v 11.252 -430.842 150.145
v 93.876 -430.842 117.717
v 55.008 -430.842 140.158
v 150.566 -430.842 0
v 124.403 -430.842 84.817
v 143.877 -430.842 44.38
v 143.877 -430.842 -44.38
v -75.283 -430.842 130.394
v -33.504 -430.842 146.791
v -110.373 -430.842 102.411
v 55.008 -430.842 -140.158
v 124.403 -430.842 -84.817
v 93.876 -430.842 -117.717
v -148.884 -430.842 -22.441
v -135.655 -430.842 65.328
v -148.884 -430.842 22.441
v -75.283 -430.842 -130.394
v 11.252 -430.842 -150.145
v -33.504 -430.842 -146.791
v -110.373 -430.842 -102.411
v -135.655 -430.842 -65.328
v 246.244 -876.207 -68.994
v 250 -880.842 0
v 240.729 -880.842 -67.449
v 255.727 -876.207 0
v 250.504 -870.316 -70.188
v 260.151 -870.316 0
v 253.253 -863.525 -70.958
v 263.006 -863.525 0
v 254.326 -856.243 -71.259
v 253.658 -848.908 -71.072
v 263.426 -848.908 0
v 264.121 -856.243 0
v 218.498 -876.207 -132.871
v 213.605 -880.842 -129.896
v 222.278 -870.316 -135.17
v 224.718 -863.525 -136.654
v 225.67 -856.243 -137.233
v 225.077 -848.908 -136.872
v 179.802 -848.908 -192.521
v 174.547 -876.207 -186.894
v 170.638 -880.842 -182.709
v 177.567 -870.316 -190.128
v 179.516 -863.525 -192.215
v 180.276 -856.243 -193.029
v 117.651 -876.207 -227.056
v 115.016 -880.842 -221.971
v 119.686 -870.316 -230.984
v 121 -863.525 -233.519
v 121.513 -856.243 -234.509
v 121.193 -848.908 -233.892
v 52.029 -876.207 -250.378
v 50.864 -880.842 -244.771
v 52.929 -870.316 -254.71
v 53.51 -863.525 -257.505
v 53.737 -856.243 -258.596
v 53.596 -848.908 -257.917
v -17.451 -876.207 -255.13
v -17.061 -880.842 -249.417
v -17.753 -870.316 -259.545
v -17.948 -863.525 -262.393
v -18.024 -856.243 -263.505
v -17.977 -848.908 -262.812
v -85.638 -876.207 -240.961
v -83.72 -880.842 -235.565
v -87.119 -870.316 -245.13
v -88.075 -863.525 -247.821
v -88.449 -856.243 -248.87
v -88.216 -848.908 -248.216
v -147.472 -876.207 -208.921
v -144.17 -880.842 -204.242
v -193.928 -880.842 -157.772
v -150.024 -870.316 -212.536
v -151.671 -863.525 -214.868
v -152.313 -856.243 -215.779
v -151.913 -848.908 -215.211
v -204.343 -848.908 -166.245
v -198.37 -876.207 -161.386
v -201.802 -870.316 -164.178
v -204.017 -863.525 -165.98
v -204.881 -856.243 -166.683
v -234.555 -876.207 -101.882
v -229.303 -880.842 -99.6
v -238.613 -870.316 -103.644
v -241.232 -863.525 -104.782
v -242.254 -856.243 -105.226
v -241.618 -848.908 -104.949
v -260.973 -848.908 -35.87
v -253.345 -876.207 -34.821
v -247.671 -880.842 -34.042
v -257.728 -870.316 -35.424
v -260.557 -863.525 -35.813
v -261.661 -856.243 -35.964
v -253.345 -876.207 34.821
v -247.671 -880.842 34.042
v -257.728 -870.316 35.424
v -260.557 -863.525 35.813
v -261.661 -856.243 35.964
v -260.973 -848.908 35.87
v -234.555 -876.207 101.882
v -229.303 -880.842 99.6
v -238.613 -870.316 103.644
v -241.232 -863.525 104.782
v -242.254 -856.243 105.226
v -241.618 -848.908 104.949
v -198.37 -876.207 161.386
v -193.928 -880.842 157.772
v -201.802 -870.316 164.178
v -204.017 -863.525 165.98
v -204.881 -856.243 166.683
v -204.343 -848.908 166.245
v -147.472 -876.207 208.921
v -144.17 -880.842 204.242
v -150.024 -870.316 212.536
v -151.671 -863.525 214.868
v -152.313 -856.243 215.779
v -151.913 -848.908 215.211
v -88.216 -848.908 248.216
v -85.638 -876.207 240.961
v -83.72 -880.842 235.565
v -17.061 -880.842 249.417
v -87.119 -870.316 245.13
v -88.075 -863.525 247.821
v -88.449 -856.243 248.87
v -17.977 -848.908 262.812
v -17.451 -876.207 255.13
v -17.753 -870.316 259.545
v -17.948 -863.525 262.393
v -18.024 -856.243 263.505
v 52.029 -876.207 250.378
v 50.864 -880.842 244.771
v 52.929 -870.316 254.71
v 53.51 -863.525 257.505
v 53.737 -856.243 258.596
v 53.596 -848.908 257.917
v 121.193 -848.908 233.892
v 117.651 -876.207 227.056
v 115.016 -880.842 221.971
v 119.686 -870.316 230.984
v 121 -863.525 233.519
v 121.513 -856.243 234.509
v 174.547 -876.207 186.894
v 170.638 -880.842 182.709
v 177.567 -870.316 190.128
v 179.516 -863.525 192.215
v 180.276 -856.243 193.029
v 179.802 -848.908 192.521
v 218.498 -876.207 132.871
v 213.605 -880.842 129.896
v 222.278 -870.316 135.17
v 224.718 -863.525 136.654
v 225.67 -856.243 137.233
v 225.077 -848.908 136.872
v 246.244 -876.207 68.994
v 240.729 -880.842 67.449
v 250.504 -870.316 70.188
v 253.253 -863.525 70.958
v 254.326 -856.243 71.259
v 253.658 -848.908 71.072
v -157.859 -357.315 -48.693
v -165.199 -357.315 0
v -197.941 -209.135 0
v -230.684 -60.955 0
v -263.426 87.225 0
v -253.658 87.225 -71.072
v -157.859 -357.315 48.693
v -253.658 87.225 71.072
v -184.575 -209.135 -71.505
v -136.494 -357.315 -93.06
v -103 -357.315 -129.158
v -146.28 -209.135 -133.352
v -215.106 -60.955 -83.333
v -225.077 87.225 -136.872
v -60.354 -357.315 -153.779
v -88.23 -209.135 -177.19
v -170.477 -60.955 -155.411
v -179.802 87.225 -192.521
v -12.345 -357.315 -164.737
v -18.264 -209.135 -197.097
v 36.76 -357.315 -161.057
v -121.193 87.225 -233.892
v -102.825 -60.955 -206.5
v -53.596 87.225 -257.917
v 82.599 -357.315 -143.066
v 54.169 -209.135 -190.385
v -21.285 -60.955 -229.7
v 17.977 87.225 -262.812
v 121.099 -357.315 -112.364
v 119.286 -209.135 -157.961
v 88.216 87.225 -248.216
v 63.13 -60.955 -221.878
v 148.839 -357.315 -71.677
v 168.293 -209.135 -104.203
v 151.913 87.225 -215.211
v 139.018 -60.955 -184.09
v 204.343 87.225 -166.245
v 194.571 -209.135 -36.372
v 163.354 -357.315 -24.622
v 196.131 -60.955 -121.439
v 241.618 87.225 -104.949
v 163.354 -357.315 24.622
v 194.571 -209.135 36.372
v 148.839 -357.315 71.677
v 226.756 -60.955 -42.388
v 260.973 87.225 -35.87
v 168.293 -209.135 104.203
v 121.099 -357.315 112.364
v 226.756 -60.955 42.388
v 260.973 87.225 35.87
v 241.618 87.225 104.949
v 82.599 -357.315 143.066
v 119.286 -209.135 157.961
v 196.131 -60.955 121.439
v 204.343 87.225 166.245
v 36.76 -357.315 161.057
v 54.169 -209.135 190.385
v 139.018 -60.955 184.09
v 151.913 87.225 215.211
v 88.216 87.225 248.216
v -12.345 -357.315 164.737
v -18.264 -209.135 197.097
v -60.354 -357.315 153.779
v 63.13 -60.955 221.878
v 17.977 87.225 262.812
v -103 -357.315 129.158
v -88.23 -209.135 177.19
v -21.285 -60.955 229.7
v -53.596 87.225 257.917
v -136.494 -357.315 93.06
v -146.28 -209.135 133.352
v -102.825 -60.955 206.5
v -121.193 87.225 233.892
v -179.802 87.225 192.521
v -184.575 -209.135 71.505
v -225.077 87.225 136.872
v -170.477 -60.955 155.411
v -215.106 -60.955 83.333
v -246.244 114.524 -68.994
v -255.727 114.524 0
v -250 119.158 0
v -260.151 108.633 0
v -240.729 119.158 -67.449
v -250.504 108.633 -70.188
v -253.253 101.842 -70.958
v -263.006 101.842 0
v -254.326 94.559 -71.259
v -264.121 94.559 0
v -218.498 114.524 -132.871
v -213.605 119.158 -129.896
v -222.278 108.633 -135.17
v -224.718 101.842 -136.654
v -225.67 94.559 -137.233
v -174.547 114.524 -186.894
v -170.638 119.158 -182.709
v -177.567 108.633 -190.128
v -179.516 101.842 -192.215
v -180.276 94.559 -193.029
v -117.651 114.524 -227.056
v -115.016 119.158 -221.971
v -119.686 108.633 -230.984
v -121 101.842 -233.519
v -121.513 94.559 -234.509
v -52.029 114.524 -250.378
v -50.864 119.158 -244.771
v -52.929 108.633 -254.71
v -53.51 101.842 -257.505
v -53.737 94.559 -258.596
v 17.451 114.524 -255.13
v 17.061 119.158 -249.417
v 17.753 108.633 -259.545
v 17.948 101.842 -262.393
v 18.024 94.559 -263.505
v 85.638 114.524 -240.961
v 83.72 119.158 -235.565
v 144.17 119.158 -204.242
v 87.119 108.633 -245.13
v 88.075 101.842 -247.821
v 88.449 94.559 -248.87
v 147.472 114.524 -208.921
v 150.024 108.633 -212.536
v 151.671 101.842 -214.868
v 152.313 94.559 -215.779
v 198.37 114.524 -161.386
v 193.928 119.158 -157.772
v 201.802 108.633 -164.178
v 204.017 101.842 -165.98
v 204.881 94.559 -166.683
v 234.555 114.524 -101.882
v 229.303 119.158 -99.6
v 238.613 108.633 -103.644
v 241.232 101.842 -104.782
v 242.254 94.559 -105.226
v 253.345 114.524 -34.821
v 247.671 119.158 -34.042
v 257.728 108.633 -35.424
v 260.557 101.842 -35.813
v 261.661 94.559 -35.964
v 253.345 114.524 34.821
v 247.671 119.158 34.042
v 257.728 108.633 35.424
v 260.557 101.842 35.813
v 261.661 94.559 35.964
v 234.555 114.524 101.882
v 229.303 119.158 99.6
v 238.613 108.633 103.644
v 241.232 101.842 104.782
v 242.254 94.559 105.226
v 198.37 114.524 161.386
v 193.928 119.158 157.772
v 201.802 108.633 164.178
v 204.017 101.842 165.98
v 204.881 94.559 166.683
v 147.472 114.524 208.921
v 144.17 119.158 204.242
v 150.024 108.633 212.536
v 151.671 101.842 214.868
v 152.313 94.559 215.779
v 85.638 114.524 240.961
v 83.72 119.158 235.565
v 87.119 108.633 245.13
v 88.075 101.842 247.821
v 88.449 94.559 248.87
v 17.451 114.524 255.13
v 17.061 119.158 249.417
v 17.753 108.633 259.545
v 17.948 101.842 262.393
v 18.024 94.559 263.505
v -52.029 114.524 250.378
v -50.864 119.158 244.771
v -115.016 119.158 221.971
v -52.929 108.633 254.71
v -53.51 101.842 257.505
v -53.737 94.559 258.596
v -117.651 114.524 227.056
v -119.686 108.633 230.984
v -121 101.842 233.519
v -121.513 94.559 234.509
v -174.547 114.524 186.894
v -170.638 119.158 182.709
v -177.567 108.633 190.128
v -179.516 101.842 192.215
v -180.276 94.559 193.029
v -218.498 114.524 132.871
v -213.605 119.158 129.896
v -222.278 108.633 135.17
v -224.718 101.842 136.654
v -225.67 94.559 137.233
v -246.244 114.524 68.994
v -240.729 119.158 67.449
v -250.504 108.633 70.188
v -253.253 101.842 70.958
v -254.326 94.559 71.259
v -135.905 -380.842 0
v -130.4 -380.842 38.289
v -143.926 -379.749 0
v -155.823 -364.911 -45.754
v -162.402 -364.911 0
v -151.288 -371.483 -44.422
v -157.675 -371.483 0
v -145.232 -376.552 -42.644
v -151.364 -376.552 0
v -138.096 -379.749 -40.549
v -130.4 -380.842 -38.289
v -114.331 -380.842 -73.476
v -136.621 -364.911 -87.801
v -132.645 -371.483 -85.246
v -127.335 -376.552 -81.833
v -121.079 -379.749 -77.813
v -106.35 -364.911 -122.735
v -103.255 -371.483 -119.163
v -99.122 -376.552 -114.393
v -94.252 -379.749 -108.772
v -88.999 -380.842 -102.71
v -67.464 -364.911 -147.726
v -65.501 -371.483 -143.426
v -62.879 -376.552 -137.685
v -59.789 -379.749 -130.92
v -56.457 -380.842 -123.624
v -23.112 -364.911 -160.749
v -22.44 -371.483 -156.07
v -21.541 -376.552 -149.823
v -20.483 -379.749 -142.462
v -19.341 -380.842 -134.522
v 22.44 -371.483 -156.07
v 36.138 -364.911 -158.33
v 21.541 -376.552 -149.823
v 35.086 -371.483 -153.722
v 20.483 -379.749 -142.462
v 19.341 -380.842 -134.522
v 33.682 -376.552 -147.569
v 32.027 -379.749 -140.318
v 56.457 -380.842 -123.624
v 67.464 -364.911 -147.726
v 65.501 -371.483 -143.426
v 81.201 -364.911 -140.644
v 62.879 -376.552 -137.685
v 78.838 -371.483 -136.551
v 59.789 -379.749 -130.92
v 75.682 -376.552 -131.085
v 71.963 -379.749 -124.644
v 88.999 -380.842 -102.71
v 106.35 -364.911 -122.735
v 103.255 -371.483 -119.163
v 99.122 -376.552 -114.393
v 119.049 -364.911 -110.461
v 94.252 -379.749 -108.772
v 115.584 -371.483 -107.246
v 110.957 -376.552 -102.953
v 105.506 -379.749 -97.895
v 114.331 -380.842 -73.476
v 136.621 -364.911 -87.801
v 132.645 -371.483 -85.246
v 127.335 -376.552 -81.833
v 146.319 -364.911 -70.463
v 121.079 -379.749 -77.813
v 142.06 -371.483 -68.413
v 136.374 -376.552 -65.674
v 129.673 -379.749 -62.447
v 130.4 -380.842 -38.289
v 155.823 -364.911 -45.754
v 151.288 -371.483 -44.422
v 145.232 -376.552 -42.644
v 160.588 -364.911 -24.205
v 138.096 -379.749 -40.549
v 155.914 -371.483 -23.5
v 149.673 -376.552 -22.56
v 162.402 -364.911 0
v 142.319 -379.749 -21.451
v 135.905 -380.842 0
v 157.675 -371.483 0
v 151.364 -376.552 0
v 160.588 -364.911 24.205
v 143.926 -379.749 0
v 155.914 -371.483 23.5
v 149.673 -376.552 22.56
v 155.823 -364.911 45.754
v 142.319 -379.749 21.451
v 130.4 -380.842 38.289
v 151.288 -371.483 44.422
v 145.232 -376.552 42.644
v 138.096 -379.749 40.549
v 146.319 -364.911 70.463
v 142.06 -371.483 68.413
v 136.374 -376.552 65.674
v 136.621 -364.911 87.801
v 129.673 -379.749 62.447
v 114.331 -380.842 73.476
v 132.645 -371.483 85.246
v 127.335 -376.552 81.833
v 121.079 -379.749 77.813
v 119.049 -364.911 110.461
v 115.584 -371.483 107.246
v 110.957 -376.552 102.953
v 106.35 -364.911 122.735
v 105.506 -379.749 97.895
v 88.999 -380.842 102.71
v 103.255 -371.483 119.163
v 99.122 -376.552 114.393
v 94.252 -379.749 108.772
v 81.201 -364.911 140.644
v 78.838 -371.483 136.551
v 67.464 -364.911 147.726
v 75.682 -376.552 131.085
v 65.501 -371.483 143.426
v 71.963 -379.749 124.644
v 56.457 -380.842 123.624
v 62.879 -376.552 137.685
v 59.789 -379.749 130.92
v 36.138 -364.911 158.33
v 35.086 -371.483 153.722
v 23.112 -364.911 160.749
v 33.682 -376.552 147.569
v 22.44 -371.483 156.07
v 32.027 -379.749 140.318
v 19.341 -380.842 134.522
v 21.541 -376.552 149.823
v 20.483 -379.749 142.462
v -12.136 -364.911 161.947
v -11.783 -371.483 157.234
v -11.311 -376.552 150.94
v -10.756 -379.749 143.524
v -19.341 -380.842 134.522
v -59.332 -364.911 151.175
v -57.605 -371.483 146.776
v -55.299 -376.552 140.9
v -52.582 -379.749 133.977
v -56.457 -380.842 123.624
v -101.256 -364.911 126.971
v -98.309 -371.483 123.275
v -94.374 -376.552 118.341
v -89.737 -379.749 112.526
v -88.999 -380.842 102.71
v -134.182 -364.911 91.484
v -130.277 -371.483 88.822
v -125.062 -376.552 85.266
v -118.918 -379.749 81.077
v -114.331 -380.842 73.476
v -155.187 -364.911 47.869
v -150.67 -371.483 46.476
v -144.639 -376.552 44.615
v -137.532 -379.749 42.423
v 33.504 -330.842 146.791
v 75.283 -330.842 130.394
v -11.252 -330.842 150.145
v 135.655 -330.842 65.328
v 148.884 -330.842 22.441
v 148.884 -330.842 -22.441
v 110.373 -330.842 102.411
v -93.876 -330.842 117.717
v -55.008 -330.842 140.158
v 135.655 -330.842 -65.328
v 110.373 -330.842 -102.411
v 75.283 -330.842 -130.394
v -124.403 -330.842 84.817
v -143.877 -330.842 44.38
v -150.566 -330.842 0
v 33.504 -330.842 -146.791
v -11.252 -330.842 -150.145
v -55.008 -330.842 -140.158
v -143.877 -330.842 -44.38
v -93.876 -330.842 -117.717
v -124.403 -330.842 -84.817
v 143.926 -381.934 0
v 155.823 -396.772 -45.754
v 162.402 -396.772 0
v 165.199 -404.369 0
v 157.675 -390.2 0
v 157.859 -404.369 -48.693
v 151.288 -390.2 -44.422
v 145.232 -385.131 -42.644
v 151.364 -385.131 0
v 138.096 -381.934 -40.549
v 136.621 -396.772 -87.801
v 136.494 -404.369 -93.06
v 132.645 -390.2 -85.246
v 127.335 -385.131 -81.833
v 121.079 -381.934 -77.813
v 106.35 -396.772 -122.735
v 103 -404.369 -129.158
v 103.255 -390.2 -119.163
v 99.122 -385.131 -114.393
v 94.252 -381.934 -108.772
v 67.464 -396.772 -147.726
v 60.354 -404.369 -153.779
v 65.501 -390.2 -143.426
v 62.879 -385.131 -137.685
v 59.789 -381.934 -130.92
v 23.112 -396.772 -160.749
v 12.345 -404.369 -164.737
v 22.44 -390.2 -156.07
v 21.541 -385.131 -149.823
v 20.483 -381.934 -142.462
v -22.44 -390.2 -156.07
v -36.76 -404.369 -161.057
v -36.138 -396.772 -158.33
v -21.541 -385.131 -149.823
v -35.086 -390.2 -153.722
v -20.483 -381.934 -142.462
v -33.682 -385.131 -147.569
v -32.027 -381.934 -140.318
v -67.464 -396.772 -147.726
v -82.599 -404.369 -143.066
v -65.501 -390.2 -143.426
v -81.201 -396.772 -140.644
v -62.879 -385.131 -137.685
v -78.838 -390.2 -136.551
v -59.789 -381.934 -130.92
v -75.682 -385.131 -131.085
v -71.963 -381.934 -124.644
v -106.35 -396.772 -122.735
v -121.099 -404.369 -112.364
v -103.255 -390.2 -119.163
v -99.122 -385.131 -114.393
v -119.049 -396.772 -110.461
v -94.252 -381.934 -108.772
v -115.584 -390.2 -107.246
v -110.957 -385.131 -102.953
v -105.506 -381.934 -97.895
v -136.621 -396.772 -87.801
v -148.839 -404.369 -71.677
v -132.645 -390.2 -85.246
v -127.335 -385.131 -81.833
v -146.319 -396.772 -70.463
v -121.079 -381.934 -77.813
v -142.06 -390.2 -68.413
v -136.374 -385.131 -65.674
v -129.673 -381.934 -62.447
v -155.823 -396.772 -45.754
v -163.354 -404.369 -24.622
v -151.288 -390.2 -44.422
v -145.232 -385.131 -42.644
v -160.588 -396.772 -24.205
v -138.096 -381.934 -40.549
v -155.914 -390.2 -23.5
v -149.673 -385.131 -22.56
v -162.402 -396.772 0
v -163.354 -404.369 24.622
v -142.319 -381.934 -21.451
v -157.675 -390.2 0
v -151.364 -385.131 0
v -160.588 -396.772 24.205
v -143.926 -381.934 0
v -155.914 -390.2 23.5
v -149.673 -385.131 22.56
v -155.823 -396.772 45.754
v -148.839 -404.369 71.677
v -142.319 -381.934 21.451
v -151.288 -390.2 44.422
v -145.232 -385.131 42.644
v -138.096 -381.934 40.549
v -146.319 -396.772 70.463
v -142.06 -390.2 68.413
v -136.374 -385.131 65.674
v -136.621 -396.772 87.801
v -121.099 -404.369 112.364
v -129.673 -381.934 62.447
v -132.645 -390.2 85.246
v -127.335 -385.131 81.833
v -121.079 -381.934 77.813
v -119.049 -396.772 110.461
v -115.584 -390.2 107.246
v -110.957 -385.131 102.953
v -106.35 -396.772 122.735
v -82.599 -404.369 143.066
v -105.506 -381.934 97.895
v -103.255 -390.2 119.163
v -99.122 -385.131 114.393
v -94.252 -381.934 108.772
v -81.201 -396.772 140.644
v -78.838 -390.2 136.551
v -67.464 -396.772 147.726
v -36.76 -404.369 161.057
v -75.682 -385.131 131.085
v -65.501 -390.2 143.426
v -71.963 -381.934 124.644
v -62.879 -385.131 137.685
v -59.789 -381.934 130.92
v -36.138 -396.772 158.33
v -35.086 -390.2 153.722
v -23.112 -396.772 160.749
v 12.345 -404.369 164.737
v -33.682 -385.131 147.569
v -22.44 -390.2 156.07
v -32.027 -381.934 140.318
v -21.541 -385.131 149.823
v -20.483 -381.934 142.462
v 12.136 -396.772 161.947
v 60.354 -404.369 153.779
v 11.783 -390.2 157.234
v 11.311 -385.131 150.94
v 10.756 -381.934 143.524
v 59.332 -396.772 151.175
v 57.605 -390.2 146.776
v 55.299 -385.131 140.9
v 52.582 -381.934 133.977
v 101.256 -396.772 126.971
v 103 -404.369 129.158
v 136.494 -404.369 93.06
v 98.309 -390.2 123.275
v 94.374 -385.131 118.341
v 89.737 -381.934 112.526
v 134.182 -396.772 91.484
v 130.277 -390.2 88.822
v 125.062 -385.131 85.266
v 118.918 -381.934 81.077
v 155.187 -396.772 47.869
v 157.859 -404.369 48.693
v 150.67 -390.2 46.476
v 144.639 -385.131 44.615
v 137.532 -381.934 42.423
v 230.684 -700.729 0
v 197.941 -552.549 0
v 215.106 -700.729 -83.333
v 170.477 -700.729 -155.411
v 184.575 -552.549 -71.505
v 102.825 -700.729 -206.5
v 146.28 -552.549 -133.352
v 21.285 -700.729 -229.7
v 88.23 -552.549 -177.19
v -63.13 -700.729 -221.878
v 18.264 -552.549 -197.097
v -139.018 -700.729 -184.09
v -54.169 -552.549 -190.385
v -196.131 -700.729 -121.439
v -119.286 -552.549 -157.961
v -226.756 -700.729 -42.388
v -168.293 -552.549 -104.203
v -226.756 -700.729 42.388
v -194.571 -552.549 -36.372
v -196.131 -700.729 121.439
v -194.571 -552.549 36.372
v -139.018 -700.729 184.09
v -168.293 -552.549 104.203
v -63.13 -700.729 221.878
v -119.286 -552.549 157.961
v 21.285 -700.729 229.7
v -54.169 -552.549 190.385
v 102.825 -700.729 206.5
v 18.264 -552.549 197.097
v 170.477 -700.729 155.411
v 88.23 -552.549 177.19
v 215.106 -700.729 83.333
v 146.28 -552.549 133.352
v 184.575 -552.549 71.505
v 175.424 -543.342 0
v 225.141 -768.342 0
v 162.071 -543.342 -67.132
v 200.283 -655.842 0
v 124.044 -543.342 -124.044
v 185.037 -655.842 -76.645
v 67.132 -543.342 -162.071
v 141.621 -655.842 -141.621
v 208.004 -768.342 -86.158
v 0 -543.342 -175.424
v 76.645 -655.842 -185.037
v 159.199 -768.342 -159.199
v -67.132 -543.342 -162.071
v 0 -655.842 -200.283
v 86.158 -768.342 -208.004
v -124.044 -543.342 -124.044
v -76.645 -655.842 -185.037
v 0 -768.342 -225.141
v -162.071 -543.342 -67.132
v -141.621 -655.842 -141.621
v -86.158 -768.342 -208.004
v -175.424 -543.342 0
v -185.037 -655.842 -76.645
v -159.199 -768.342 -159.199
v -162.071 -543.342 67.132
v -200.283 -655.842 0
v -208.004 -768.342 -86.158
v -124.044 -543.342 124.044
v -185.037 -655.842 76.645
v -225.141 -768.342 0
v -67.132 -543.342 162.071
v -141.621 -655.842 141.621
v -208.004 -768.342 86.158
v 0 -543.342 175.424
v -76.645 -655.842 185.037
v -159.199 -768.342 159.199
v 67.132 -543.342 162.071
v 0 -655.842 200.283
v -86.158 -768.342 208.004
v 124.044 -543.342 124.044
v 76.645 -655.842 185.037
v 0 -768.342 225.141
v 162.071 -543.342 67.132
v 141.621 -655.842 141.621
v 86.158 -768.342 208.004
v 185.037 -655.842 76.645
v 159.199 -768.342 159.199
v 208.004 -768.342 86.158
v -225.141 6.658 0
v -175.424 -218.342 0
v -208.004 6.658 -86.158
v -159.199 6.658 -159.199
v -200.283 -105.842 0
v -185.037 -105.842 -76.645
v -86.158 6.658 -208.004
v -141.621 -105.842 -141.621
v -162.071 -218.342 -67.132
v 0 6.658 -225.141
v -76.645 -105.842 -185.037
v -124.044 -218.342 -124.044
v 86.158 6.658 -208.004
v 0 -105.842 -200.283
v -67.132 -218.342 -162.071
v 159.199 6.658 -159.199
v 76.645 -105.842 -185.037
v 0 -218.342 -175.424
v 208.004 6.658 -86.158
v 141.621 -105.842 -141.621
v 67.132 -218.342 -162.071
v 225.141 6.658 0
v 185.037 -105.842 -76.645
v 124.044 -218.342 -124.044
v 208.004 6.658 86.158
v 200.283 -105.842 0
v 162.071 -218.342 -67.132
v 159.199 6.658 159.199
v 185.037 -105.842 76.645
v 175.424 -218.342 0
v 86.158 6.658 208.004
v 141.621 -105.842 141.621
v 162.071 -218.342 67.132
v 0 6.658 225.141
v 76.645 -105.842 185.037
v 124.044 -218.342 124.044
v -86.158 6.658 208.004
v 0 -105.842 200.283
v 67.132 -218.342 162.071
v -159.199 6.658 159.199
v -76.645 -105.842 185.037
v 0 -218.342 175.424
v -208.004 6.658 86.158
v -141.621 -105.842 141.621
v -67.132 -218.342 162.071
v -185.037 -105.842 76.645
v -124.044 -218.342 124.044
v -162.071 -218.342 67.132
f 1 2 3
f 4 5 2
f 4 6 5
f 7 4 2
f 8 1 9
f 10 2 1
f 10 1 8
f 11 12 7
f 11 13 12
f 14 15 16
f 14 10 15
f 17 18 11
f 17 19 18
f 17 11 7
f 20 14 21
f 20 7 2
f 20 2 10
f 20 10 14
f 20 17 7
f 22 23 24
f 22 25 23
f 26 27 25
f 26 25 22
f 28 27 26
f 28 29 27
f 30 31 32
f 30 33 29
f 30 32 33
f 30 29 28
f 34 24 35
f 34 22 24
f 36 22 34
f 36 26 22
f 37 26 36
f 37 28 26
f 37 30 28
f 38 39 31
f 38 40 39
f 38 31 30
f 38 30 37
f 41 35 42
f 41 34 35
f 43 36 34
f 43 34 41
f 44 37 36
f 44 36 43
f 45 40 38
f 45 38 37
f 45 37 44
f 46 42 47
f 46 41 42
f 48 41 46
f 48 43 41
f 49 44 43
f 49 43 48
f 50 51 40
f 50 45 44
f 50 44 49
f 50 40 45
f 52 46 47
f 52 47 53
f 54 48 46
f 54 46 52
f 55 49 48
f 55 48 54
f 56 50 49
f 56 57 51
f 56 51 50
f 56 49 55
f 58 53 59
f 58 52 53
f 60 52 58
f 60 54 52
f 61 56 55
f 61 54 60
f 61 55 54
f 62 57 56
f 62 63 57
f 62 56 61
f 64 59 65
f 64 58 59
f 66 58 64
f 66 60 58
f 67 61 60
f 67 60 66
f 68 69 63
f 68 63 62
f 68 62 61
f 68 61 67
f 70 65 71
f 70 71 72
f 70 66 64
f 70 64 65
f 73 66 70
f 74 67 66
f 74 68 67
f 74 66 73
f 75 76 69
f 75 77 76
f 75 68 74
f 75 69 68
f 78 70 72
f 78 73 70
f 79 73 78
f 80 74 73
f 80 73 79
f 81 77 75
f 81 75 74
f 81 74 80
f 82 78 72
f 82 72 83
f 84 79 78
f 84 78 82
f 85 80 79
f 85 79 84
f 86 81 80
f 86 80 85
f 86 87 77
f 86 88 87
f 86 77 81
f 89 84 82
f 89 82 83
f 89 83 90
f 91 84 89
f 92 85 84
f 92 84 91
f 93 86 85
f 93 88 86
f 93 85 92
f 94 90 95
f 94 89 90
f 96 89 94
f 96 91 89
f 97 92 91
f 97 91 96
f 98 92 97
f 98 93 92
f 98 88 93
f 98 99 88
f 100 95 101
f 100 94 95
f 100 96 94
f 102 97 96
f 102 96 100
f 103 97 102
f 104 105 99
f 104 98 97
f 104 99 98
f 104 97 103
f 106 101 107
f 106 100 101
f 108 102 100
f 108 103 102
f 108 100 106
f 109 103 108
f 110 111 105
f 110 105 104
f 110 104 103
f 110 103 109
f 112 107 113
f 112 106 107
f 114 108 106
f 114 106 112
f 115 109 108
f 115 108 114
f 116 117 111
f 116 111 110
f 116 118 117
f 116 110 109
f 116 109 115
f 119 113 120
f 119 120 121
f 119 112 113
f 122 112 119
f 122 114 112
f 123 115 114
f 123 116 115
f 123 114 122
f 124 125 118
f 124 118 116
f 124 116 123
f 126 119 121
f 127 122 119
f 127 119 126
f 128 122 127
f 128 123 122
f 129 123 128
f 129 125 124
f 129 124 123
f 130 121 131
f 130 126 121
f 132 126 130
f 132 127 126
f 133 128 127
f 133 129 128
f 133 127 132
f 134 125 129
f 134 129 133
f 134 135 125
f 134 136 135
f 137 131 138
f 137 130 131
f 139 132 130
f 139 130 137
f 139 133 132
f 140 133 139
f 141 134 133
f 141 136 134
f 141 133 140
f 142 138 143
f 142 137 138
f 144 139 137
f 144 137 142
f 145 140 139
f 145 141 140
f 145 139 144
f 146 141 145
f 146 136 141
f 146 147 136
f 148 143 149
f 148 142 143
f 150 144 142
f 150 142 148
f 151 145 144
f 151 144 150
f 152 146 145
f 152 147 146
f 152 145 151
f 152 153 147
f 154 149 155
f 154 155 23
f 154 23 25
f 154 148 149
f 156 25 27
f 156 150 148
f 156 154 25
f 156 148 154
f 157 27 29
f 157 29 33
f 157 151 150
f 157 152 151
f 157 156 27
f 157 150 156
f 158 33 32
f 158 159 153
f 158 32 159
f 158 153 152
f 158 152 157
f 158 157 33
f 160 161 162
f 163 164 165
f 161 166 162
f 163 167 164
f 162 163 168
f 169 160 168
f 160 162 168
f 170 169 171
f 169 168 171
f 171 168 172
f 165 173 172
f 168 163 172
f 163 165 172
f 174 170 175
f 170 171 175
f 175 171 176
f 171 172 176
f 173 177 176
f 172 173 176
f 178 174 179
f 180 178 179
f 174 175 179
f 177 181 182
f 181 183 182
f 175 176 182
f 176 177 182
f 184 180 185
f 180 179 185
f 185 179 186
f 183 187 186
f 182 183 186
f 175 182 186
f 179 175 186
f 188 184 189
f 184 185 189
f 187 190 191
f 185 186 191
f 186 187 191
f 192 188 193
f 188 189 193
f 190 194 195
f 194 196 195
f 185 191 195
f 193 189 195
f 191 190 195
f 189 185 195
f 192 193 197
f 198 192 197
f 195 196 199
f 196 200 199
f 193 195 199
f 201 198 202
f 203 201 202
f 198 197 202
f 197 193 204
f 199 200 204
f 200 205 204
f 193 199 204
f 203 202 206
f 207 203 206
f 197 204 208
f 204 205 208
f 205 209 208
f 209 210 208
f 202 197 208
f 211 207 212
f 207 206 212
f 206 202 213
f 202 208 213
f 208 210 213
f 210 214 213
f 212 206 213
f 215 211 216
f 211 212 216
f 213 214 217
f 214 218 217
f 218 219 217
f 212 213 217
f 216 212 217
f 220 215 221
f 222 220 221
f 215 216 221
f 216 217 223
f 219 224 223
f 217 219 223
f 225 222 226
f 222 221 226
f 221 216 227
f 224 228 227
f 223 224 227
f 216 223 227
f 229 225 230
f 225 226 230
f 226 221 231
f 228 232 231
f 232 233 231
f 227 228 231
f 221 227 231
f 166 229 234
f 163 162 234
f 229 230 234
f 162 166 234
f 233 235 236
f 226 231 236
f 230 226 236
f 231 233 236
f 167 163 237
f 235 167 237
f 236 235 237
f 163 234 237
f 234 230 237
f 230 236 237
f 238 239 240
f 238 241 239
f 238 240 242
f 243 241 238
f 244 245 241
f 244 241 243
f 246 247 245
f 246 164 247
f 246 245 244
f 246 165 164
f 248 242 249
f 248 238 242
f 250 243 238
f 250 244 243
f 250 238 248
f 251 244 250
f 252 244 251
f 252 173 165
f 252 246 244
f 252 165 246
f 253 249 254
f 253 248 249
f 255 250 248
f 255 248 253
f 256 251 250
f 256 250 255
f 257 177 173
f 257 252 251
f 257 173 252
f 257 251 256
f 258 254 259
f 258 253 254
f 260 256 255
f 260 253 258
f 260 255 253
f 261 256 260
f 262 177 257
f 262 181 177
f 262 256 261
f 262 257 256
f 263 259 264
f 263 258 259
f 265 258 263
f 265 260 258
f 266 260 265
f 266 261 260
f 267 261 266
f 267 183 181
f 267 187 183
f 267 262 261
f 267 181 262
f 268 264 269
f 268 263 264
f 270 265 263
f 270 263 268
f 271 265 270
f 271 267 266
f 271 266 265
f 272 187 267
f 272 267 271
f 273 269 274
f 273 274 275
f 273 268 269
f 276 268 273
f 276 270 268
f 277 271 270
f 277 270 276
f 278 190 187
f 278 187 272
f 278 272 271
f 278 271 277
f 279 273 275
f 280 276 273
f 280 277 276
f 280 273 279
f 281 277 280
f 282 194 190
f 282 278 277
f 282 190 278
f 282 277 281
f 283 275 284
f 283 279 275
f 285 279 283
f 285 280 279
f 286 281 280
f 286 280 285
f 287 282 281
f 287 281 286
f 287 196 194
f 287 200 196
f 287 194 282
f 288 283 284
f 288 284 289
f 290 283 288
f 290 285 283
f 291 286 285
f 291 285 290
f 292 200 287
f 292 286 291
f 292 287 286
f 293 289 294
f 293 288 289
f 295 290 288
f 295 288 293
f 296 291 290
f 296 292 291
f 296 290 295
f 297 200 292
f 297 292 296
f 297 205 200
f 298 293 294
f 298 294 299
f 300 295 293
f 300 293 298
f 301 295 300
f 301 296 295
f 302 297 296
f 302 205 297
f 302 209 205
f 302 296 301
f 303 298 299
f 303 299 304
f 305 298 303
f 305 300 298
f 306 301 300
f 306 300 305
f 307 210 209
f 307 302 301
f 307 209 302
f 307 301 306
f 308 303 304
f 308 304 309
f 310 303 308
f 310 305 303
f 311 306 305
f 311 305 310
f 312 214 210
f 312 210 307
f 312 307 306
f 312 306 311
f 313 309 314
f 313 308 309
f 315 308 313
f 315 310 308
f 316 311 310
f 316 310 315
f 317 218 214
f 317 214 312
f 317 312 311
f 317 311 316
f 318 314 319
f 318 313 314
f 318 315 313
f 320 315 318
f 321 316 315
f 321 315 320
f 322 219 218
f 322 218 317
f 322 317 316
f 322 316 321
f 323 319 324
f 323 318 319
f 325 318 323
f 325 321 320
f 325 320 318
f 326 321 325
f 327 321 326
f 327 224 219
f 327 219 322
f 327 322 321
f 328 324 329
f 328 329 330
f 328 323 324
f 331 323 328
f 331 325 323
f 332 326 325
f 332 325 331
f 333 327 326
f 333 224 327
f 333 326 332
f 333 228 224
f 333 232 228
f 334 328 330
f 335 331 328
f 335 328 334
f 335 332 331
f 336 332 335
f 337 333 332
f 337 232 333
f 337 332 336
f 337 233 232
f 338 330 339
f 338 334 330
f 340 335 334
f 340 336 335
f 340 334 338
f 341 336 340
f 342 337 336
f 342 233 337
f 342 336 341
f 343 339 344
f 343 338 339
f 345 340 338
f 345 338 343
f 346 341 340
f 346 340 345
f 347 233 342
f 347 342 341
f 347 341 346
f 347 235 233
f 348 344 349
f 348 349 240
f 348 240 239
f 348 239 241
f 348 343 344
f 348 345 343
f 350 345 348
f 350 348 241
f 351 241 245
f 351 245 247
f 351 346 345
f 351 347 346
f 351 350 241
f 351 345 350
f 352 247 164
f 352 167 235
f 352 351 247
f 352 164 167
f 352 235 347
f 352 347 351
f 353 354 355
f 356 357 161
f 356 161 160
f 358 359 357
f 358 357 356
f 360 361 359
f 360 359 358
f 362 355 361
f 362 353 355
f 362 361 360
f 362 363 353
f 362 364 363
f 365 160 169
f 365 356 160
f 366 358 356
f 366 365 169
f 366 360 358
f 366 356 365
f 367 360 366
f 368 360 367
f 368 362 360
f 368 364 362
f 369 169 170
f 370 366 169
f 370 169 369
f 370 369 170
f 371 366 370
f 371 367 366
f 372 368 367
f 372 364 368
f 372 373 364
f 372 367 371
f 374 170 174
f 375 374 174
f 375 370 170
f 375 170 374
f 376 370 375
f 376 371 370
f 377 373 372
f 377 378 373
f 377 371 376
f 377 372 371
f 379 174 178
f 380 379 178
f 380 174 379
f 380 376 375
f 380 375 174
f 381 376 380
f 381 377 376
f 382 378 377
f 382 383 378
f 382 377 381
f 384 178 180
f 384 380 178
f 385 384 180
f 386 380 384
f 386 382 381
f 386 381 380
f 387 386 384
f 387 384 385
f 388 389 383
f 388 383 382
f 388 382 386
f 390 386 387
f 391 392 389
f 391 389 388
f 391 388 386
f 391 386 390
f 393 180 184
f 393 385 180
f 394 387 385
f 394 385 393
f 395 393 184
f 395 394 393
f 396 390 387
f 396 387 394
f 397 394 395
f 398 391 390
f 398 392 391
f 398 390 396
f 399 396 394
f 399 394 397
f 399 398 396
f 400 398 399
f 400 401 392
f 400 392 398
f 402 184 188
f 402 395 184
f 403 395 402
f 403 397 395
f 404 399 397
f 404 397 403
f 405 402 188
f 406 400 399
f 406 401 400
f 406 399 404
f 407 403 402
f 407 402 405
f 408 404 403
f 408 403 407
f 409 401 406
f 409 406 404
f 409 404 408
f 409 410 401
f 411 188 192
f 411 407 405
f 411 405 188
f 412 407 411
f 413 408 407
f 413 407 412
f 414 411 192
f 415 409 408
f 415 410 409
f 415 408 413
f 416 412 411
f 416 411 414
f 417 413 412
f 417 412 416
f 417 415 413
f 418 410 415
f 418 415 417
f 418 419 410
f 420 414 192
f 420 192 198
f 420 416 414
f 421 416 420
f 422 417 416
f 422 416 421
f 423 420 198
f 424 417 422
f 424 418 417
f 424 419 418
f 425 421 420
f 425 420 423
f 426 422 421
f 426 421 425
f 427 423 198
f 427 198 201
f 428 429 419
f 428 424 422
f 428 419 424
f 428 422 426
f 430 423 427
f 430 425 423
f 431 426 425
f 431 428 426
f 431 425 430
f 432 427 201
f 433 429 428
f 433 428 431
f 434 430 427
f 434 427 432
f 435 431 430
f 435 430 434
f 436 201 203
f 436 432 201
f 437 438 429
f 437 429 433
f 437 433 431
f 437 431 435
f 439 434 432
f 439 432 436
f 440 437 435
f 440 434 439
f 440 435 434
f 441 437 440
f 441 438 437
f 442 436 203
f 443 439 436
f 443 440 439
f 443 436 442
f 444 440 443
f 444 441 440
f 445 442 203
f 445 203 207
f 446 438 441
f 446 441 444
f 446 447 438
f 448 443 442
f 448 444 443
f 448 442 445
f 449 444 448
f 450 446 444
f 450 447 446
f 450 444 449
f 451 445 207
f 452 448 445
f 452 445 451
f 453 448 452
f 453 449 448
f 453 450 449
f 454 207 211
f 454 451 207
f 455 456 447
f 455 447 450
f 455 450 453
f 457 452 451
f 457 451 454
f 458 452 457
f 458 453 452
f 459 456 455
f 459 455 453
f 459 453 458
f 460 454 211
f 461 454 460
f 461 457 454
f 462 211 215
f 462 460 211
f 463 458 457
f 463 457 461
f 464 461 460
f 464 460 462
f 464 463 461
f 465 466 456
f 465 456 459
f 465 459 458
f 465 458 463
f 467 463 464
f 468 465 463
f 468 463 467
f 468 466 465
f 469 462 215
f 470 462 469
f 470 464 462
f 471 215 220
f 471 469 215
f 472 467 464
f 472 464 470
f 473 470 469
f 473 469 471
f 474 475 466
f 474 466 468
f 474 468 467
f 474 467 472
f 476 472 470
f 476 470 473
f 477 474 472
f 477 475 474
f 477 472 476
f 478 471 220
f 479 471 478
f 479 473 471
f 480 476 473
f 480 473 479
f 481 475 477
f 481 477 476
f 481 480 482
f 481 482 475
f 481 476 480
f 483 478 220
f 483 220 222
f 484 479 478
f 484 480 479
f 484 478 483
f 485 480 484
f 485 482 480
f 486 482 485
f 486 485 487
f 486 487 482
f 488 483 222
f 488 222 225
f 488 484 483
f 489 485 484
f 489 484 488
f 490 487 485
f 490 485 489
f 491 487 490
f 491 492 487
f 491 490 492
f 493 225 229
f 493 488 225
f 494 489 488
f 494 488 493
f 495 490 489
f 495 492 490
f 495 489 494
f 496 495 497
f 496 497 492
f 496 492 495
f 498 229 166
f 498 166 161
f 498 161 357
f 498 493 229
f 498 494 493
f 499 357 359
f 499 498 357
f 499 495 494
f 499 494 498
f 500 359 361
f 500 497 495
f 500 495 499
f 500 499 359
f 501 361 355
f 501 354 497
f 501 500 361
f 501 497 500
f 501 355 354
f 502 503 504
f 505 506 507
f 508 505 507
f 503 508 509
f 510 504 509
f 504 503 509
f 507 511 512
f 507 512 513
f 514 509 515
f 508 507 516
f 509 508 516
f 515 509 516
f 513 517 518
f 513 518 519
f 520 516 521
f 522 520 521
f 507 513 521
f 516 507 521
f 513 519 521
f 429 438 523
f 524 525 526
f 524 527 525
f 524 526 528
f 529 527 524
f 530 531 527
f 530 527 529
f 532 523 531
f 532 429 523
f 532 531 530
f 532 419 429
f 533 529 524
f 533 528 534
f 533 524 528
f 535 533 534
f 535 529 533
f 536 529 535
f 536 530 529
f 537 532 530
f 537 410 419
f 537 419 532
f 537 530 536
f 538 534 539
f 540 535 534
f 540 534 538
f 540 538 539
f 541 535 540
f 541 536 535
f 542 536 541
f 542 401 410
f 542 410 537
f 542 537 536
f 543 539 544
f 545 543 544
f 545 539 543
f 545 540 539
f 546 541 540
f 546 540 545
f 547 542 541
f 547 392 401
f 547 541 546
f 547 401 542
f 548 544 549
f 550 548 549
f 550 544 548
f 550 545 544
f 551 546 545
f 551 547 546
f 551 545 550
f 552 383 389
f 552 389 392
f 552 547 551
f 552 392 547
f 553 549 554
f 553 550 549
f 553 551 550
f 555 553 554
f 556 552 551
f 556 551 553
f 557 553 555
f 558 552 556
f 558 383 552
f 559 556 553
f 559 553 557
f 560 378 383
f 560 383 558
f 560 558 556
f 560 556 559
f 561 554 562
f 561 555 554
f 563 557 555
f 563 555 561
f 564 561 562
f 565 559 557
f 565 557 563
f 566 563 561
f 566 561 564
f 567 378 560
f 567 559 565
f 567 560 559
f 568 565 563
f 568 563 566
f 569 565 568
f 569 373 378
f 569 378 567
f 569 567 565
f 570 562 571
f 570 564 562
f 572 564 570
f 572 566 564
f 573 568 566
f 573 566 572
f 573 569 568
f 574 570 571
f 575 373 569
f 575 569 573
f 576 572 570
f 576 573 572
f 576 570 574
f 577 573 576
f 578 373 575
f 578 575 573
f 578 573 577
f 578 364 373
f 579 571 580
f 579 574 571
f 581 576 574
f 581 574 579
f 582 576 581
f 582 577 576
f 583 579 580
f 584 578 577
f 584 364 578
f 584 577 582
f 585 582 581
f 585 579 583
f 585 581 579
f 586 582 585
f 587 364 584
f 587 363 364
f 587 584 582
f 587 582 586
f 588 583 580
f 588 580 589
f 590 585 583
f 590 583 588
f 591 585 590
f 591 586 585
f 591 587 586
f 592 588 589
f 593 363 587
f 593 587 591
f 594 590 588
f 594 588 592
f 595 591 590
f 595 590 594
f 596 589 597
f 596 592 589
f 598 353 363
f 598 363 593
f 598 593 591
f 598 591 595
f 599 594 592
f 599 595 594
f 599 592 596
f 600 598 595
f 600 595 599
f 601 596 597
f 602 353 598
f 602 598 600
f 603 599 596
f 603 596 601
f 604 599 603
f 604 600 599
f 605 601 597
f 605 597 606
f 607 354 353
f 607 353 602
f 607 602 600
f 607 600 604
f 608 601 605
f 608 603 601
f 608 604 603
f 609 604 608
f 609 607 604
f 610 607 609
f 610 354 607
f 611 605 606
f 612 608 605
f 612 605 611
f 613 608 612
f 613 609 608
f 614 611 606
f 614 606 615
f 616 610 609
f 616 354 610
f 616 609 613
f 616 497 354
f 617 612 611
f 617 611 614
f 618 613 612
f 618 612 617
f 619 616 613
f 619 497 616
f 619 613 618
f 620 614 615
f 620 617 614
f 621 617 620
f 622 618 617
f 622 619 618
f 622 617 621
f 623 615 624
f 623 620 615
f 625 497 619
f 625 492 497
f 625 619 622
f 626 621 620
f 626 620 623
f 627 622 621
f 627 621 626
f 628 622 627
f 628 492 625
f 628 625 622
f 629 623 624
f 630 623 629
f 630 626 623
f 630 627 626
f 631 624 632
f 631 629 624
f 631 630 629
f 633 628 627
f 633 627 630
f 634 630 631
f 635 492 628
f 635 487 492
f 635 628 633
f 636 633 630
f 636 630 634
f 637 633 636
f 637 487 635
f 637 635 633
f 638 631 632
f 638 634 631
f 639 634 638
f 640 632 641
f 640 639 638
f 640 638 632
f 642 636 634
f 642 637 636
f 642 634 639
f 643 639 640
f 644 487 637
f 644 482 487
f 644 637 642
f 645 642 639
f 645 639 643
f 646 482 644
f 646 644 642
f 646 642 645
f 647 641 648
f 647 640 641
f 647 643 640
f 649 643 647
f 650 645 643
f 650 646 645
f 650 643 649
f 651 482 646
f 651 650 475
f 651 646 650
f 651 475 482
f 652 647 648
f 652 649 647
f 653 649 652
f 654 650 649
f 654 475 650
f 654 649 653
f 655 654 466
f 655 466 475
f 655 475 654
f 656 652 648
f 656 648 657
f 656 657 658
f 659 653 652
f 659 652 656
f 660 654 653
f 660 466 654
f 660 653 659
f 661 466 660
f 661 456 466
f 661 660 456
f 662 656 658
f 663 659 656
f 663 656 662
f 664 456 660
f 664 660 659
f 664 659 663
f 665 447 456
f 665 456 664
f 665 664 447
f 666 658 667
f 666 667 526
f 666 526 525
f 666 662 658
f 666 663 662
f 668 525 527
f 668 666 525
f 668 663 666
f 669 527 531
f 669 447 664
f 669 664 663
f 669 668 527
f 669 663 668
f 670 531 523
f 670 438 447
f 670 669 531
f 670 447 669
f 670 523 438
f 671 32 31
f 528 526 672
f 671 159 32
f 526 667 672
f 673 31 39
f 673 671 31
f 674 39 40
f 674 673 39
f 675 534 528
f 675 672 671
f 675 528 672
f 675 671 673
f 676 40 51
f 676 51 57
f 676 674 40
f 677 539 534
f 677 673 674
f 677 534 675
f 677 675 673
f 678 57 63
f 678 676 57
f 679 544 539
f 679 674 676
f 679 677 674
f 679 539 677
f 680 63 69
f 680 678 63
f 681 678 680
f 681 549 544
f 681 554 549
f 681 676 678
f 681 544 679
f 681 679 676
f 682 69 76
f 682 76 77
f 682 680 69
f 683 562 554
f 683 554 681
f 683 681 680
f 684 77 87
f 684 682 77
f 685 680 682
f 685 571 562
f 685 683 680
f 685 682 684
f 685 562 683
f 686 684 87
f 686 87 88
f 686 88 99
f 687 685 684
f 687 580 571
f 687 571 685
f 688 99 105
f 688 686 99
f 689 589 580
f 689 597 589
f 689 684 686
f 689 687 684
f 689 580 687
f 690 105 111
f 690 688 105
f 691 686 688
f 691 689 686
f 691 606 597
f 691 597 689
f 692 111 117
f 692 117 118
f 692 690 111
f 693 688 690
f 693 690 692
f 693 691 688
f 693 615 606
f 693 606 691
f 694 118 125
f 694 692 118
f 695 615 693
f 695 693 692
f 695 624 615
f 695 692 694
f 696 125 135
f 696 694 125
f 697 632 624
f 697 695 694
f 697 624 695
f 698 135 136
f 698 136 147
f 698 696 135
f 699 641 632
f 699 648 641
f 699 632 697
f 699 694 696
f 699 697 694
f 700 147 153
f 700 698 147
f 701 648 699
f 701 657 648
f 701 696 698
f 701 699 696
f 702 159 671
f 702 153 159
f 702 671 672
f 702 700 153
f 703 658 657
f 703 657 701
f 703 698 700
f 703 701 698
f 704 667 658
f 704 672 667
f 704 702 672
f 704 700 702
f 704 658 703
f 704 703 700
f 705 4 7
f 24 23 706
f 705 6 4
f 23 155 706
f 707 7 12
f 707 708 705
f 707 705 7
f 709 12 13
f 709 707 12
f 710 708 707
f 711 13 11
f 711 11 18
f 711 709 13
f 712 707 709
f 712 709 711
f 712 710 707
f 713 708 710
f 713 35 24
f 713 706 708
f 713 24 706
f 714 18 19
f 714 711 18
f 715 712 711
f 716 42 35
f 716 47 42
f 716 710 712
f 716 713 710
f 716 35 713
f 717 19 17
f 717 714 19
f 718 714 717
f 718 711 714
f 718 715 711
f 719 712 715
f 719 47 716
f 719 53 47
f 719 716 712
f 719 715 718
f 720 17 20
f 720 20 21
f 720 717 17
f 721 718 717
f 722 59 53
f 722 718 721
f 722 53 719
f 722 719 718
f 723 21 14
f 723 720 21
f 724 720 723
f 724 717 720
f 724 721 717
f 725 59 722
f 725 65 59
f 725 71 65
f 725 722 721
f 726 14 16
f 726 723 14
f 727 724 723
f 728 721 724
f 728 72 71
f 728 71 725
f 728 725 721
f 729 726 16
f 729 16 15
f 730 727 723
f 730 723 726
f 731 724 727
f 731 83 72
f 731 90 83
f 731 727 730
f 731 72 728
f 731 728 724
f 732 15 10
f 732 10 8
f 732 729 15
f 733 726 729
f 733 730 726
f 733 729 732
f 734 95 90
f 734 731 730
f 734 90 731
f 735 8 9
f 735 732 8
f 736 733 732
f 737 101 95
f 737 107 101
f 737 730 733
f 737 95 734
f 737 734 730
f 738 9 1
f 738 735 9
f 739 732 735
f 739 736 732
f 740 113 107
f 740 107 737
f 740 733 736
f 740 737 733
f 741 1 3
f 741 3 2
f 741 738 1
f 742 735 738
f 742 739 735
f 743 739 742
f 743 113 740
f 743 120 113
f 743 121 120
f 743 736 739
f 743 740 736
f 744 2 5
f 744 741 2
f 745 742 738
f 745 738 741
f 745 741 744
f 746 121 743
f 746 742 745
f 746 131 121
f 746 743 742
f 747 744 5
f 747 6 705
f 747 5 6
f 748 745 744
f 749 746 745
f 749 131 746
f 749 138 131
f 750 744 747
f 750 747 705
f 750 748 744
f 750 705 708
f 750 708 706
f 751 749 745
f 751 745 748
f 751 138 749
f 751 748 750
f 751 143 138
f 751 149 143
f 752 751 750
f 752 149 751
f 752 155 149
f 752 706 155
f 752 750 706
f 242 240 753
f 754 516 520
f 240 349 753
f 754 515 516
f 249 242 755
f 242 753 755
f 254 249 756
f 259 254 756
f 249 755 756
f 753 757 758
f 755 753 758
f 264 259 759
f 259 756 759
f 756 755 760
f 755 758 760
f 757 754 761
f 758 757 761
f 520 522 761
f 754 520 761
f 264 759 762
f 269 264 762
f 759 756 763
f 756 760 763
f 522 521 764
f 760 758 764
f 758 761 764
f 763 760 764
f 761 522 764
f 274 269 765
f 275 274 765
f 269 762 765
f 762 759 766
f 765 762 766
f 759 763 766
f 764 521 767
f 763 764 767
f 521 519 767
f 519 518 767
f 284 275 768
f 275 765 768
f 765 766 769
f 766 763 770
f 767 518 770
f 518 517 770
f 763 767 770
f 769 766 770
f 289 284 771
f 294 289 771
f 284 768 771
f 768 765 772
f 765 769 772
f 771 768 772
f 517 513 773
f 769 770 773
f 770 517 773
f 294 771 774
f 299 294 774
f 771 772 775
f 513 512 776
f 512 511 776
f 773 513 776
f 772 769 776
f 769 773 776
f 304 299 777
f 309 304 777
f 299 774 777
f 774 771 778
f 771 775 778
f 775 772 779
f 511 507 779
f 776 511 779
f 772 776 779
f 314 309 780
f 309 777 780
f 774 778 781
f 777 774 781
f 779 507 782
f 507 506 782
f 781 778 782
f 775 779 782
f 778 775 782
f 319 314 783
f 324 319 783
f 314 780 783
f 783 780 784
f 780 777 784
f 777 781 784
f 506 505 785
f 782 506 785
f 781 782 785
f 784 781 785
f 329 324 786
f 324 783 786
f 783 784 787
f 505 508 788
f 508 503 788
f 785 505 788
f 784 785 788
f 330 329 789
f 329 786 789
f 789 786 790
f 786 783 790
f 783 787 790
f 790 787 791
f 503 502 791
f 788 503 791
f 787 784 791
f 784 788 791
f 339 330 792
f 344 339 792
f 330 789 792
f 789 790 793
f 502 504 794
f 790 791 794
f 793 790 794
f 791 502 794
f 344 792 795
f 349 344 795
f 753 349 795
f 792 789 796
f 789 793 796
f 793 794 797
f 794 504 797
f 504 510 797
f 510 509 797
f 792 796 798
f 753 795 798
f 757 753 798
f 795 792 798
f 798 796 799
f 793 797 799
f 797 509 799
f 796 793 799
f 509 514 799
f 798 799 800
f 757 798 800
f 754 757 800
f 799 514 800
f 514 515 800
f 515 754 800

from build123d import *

# Parameters (mm, degrees)
FILLET1_R = 30


# Read off the part's stored shape, not the designer's step: Mirror1
with BuildPart() as part:
    # Sketch1 → Revolve1 (revolve)
    with BuildSketch(Plane.XY, mode=Mode.PRIVATE) as revolve1_sk:
        Polygon((0, -330.841690926), (0, -380.841690926), (160, -380.841690926), (270.482436132, 119.158309074), (250, 119.158309074), (150.565807481, -330.841690926), align=None)
    revolve(revolve1_sk.sketch.rotate(Axis((0, -330.841690926, 0), (0, -1, 0)), 180), axis=Axis((0, -330.841690926, 0), (0, -1, 0)))

    # Fillet1
    # the kernel refuses this fillet: 30 mm, written as the material it takes off along each edge
    with BuildSketch(Plane(origin=(0, -380.841690926, 0), x_dir=(-1, 0, 0), z_dir=(0, 0, 1))) as fillet1_piece_1:
        with BuildLine():
            CenterArc((160 - FILLET1_R * 0.803156934346, -FILLET1_R), FILLET1_R, 12.46013877, 77.53986123)
            Line((160 + FILLET1_R * 0.173289415634, -FILLET1_R * 0.784239657004), (160 + FILLET1_R * 0.192818342634, -FILLET1_R * 0.779924450144))
            Line((160 + FILLET1_R * 0.192818342634, -FILLET1_R * 0.779924450144), (160 + FILLET1_R * 0.0160631386869, FILLET1_R * 0.02))
            Line((160 + FILLET1_R * 0.0160631386869, FILLET1_R * 0.02), (160 - FILLET1_R * 0.803156934346, FILLET1_R * 0.02))
            Line((160 - FILLET1_R * 0.803156934346, FILLET1_R * 0.02), (160 - FILLET1_R * 0.803156934346, 0))
        make_face()
    revolve(axis=Axis((0, -380.841690926, 0), (0, -1, 0)), mode=Mode.SUBTRACT)
    with BuildSketch(Plane(origin=(0, 119.158309074, 0), x_dir=(-1, 0, 0), z_dir=(0, 0, 1))) as fillet1_piece_2:
        with BuildLine():
            CenterArc((234.132912434, 25.460469991), FILLET1_R, 301.931359404, 70.528779366)
            Line((250, 0), (250.317341751, -0.5092094))
            ThreePointArc((250.317341751, -0.5092094), (260.241218066, -0.6), (270.482436132, -0.6))
            Line((270.482436132, -0.6), (271.068303942, 0.129456206))
            Line((271.068303942, 0.129456206), (264.012170744, 32.062736487))
            Line((264.012170744, 32.062736487), (263.426302934, 31.933280281))
        make_face()
    revolve(axis=Axis((0, 119.158309074, 0), (0, -1, 0)), mode=Mode.SUBTRACT)

    # Mirror1 outline → Mirror1 (revolve)
    with BuildSketch(Plane.XY):
        with BuildLine():
            Line((0, -380.841690926), (0, -430.841690926))
            Line((0, -430.841690926), (150.565807481, -430.841690926))
            Line((150.565807481, -430.841690926), (250, -880.841690926))
            ThreePointArc((250, -880.841690926), (261.787944384, -867.008740354), (263.426302934, -848.908410644))
            Line((263.426302934, -848.908410644), (165.198682469, -404.368880636))
            ThreePointArc((165.198682469, -404.368880636), (154.691133597, -387.451689764), (135.90529197, -380.841690926))
            Line((135.90529197, -380.841690926), (0, -380.841690926))
        make_face()
    revolve(axis=Axis((0, 0, 0), (0, 1, 0)))


solid = part.part
